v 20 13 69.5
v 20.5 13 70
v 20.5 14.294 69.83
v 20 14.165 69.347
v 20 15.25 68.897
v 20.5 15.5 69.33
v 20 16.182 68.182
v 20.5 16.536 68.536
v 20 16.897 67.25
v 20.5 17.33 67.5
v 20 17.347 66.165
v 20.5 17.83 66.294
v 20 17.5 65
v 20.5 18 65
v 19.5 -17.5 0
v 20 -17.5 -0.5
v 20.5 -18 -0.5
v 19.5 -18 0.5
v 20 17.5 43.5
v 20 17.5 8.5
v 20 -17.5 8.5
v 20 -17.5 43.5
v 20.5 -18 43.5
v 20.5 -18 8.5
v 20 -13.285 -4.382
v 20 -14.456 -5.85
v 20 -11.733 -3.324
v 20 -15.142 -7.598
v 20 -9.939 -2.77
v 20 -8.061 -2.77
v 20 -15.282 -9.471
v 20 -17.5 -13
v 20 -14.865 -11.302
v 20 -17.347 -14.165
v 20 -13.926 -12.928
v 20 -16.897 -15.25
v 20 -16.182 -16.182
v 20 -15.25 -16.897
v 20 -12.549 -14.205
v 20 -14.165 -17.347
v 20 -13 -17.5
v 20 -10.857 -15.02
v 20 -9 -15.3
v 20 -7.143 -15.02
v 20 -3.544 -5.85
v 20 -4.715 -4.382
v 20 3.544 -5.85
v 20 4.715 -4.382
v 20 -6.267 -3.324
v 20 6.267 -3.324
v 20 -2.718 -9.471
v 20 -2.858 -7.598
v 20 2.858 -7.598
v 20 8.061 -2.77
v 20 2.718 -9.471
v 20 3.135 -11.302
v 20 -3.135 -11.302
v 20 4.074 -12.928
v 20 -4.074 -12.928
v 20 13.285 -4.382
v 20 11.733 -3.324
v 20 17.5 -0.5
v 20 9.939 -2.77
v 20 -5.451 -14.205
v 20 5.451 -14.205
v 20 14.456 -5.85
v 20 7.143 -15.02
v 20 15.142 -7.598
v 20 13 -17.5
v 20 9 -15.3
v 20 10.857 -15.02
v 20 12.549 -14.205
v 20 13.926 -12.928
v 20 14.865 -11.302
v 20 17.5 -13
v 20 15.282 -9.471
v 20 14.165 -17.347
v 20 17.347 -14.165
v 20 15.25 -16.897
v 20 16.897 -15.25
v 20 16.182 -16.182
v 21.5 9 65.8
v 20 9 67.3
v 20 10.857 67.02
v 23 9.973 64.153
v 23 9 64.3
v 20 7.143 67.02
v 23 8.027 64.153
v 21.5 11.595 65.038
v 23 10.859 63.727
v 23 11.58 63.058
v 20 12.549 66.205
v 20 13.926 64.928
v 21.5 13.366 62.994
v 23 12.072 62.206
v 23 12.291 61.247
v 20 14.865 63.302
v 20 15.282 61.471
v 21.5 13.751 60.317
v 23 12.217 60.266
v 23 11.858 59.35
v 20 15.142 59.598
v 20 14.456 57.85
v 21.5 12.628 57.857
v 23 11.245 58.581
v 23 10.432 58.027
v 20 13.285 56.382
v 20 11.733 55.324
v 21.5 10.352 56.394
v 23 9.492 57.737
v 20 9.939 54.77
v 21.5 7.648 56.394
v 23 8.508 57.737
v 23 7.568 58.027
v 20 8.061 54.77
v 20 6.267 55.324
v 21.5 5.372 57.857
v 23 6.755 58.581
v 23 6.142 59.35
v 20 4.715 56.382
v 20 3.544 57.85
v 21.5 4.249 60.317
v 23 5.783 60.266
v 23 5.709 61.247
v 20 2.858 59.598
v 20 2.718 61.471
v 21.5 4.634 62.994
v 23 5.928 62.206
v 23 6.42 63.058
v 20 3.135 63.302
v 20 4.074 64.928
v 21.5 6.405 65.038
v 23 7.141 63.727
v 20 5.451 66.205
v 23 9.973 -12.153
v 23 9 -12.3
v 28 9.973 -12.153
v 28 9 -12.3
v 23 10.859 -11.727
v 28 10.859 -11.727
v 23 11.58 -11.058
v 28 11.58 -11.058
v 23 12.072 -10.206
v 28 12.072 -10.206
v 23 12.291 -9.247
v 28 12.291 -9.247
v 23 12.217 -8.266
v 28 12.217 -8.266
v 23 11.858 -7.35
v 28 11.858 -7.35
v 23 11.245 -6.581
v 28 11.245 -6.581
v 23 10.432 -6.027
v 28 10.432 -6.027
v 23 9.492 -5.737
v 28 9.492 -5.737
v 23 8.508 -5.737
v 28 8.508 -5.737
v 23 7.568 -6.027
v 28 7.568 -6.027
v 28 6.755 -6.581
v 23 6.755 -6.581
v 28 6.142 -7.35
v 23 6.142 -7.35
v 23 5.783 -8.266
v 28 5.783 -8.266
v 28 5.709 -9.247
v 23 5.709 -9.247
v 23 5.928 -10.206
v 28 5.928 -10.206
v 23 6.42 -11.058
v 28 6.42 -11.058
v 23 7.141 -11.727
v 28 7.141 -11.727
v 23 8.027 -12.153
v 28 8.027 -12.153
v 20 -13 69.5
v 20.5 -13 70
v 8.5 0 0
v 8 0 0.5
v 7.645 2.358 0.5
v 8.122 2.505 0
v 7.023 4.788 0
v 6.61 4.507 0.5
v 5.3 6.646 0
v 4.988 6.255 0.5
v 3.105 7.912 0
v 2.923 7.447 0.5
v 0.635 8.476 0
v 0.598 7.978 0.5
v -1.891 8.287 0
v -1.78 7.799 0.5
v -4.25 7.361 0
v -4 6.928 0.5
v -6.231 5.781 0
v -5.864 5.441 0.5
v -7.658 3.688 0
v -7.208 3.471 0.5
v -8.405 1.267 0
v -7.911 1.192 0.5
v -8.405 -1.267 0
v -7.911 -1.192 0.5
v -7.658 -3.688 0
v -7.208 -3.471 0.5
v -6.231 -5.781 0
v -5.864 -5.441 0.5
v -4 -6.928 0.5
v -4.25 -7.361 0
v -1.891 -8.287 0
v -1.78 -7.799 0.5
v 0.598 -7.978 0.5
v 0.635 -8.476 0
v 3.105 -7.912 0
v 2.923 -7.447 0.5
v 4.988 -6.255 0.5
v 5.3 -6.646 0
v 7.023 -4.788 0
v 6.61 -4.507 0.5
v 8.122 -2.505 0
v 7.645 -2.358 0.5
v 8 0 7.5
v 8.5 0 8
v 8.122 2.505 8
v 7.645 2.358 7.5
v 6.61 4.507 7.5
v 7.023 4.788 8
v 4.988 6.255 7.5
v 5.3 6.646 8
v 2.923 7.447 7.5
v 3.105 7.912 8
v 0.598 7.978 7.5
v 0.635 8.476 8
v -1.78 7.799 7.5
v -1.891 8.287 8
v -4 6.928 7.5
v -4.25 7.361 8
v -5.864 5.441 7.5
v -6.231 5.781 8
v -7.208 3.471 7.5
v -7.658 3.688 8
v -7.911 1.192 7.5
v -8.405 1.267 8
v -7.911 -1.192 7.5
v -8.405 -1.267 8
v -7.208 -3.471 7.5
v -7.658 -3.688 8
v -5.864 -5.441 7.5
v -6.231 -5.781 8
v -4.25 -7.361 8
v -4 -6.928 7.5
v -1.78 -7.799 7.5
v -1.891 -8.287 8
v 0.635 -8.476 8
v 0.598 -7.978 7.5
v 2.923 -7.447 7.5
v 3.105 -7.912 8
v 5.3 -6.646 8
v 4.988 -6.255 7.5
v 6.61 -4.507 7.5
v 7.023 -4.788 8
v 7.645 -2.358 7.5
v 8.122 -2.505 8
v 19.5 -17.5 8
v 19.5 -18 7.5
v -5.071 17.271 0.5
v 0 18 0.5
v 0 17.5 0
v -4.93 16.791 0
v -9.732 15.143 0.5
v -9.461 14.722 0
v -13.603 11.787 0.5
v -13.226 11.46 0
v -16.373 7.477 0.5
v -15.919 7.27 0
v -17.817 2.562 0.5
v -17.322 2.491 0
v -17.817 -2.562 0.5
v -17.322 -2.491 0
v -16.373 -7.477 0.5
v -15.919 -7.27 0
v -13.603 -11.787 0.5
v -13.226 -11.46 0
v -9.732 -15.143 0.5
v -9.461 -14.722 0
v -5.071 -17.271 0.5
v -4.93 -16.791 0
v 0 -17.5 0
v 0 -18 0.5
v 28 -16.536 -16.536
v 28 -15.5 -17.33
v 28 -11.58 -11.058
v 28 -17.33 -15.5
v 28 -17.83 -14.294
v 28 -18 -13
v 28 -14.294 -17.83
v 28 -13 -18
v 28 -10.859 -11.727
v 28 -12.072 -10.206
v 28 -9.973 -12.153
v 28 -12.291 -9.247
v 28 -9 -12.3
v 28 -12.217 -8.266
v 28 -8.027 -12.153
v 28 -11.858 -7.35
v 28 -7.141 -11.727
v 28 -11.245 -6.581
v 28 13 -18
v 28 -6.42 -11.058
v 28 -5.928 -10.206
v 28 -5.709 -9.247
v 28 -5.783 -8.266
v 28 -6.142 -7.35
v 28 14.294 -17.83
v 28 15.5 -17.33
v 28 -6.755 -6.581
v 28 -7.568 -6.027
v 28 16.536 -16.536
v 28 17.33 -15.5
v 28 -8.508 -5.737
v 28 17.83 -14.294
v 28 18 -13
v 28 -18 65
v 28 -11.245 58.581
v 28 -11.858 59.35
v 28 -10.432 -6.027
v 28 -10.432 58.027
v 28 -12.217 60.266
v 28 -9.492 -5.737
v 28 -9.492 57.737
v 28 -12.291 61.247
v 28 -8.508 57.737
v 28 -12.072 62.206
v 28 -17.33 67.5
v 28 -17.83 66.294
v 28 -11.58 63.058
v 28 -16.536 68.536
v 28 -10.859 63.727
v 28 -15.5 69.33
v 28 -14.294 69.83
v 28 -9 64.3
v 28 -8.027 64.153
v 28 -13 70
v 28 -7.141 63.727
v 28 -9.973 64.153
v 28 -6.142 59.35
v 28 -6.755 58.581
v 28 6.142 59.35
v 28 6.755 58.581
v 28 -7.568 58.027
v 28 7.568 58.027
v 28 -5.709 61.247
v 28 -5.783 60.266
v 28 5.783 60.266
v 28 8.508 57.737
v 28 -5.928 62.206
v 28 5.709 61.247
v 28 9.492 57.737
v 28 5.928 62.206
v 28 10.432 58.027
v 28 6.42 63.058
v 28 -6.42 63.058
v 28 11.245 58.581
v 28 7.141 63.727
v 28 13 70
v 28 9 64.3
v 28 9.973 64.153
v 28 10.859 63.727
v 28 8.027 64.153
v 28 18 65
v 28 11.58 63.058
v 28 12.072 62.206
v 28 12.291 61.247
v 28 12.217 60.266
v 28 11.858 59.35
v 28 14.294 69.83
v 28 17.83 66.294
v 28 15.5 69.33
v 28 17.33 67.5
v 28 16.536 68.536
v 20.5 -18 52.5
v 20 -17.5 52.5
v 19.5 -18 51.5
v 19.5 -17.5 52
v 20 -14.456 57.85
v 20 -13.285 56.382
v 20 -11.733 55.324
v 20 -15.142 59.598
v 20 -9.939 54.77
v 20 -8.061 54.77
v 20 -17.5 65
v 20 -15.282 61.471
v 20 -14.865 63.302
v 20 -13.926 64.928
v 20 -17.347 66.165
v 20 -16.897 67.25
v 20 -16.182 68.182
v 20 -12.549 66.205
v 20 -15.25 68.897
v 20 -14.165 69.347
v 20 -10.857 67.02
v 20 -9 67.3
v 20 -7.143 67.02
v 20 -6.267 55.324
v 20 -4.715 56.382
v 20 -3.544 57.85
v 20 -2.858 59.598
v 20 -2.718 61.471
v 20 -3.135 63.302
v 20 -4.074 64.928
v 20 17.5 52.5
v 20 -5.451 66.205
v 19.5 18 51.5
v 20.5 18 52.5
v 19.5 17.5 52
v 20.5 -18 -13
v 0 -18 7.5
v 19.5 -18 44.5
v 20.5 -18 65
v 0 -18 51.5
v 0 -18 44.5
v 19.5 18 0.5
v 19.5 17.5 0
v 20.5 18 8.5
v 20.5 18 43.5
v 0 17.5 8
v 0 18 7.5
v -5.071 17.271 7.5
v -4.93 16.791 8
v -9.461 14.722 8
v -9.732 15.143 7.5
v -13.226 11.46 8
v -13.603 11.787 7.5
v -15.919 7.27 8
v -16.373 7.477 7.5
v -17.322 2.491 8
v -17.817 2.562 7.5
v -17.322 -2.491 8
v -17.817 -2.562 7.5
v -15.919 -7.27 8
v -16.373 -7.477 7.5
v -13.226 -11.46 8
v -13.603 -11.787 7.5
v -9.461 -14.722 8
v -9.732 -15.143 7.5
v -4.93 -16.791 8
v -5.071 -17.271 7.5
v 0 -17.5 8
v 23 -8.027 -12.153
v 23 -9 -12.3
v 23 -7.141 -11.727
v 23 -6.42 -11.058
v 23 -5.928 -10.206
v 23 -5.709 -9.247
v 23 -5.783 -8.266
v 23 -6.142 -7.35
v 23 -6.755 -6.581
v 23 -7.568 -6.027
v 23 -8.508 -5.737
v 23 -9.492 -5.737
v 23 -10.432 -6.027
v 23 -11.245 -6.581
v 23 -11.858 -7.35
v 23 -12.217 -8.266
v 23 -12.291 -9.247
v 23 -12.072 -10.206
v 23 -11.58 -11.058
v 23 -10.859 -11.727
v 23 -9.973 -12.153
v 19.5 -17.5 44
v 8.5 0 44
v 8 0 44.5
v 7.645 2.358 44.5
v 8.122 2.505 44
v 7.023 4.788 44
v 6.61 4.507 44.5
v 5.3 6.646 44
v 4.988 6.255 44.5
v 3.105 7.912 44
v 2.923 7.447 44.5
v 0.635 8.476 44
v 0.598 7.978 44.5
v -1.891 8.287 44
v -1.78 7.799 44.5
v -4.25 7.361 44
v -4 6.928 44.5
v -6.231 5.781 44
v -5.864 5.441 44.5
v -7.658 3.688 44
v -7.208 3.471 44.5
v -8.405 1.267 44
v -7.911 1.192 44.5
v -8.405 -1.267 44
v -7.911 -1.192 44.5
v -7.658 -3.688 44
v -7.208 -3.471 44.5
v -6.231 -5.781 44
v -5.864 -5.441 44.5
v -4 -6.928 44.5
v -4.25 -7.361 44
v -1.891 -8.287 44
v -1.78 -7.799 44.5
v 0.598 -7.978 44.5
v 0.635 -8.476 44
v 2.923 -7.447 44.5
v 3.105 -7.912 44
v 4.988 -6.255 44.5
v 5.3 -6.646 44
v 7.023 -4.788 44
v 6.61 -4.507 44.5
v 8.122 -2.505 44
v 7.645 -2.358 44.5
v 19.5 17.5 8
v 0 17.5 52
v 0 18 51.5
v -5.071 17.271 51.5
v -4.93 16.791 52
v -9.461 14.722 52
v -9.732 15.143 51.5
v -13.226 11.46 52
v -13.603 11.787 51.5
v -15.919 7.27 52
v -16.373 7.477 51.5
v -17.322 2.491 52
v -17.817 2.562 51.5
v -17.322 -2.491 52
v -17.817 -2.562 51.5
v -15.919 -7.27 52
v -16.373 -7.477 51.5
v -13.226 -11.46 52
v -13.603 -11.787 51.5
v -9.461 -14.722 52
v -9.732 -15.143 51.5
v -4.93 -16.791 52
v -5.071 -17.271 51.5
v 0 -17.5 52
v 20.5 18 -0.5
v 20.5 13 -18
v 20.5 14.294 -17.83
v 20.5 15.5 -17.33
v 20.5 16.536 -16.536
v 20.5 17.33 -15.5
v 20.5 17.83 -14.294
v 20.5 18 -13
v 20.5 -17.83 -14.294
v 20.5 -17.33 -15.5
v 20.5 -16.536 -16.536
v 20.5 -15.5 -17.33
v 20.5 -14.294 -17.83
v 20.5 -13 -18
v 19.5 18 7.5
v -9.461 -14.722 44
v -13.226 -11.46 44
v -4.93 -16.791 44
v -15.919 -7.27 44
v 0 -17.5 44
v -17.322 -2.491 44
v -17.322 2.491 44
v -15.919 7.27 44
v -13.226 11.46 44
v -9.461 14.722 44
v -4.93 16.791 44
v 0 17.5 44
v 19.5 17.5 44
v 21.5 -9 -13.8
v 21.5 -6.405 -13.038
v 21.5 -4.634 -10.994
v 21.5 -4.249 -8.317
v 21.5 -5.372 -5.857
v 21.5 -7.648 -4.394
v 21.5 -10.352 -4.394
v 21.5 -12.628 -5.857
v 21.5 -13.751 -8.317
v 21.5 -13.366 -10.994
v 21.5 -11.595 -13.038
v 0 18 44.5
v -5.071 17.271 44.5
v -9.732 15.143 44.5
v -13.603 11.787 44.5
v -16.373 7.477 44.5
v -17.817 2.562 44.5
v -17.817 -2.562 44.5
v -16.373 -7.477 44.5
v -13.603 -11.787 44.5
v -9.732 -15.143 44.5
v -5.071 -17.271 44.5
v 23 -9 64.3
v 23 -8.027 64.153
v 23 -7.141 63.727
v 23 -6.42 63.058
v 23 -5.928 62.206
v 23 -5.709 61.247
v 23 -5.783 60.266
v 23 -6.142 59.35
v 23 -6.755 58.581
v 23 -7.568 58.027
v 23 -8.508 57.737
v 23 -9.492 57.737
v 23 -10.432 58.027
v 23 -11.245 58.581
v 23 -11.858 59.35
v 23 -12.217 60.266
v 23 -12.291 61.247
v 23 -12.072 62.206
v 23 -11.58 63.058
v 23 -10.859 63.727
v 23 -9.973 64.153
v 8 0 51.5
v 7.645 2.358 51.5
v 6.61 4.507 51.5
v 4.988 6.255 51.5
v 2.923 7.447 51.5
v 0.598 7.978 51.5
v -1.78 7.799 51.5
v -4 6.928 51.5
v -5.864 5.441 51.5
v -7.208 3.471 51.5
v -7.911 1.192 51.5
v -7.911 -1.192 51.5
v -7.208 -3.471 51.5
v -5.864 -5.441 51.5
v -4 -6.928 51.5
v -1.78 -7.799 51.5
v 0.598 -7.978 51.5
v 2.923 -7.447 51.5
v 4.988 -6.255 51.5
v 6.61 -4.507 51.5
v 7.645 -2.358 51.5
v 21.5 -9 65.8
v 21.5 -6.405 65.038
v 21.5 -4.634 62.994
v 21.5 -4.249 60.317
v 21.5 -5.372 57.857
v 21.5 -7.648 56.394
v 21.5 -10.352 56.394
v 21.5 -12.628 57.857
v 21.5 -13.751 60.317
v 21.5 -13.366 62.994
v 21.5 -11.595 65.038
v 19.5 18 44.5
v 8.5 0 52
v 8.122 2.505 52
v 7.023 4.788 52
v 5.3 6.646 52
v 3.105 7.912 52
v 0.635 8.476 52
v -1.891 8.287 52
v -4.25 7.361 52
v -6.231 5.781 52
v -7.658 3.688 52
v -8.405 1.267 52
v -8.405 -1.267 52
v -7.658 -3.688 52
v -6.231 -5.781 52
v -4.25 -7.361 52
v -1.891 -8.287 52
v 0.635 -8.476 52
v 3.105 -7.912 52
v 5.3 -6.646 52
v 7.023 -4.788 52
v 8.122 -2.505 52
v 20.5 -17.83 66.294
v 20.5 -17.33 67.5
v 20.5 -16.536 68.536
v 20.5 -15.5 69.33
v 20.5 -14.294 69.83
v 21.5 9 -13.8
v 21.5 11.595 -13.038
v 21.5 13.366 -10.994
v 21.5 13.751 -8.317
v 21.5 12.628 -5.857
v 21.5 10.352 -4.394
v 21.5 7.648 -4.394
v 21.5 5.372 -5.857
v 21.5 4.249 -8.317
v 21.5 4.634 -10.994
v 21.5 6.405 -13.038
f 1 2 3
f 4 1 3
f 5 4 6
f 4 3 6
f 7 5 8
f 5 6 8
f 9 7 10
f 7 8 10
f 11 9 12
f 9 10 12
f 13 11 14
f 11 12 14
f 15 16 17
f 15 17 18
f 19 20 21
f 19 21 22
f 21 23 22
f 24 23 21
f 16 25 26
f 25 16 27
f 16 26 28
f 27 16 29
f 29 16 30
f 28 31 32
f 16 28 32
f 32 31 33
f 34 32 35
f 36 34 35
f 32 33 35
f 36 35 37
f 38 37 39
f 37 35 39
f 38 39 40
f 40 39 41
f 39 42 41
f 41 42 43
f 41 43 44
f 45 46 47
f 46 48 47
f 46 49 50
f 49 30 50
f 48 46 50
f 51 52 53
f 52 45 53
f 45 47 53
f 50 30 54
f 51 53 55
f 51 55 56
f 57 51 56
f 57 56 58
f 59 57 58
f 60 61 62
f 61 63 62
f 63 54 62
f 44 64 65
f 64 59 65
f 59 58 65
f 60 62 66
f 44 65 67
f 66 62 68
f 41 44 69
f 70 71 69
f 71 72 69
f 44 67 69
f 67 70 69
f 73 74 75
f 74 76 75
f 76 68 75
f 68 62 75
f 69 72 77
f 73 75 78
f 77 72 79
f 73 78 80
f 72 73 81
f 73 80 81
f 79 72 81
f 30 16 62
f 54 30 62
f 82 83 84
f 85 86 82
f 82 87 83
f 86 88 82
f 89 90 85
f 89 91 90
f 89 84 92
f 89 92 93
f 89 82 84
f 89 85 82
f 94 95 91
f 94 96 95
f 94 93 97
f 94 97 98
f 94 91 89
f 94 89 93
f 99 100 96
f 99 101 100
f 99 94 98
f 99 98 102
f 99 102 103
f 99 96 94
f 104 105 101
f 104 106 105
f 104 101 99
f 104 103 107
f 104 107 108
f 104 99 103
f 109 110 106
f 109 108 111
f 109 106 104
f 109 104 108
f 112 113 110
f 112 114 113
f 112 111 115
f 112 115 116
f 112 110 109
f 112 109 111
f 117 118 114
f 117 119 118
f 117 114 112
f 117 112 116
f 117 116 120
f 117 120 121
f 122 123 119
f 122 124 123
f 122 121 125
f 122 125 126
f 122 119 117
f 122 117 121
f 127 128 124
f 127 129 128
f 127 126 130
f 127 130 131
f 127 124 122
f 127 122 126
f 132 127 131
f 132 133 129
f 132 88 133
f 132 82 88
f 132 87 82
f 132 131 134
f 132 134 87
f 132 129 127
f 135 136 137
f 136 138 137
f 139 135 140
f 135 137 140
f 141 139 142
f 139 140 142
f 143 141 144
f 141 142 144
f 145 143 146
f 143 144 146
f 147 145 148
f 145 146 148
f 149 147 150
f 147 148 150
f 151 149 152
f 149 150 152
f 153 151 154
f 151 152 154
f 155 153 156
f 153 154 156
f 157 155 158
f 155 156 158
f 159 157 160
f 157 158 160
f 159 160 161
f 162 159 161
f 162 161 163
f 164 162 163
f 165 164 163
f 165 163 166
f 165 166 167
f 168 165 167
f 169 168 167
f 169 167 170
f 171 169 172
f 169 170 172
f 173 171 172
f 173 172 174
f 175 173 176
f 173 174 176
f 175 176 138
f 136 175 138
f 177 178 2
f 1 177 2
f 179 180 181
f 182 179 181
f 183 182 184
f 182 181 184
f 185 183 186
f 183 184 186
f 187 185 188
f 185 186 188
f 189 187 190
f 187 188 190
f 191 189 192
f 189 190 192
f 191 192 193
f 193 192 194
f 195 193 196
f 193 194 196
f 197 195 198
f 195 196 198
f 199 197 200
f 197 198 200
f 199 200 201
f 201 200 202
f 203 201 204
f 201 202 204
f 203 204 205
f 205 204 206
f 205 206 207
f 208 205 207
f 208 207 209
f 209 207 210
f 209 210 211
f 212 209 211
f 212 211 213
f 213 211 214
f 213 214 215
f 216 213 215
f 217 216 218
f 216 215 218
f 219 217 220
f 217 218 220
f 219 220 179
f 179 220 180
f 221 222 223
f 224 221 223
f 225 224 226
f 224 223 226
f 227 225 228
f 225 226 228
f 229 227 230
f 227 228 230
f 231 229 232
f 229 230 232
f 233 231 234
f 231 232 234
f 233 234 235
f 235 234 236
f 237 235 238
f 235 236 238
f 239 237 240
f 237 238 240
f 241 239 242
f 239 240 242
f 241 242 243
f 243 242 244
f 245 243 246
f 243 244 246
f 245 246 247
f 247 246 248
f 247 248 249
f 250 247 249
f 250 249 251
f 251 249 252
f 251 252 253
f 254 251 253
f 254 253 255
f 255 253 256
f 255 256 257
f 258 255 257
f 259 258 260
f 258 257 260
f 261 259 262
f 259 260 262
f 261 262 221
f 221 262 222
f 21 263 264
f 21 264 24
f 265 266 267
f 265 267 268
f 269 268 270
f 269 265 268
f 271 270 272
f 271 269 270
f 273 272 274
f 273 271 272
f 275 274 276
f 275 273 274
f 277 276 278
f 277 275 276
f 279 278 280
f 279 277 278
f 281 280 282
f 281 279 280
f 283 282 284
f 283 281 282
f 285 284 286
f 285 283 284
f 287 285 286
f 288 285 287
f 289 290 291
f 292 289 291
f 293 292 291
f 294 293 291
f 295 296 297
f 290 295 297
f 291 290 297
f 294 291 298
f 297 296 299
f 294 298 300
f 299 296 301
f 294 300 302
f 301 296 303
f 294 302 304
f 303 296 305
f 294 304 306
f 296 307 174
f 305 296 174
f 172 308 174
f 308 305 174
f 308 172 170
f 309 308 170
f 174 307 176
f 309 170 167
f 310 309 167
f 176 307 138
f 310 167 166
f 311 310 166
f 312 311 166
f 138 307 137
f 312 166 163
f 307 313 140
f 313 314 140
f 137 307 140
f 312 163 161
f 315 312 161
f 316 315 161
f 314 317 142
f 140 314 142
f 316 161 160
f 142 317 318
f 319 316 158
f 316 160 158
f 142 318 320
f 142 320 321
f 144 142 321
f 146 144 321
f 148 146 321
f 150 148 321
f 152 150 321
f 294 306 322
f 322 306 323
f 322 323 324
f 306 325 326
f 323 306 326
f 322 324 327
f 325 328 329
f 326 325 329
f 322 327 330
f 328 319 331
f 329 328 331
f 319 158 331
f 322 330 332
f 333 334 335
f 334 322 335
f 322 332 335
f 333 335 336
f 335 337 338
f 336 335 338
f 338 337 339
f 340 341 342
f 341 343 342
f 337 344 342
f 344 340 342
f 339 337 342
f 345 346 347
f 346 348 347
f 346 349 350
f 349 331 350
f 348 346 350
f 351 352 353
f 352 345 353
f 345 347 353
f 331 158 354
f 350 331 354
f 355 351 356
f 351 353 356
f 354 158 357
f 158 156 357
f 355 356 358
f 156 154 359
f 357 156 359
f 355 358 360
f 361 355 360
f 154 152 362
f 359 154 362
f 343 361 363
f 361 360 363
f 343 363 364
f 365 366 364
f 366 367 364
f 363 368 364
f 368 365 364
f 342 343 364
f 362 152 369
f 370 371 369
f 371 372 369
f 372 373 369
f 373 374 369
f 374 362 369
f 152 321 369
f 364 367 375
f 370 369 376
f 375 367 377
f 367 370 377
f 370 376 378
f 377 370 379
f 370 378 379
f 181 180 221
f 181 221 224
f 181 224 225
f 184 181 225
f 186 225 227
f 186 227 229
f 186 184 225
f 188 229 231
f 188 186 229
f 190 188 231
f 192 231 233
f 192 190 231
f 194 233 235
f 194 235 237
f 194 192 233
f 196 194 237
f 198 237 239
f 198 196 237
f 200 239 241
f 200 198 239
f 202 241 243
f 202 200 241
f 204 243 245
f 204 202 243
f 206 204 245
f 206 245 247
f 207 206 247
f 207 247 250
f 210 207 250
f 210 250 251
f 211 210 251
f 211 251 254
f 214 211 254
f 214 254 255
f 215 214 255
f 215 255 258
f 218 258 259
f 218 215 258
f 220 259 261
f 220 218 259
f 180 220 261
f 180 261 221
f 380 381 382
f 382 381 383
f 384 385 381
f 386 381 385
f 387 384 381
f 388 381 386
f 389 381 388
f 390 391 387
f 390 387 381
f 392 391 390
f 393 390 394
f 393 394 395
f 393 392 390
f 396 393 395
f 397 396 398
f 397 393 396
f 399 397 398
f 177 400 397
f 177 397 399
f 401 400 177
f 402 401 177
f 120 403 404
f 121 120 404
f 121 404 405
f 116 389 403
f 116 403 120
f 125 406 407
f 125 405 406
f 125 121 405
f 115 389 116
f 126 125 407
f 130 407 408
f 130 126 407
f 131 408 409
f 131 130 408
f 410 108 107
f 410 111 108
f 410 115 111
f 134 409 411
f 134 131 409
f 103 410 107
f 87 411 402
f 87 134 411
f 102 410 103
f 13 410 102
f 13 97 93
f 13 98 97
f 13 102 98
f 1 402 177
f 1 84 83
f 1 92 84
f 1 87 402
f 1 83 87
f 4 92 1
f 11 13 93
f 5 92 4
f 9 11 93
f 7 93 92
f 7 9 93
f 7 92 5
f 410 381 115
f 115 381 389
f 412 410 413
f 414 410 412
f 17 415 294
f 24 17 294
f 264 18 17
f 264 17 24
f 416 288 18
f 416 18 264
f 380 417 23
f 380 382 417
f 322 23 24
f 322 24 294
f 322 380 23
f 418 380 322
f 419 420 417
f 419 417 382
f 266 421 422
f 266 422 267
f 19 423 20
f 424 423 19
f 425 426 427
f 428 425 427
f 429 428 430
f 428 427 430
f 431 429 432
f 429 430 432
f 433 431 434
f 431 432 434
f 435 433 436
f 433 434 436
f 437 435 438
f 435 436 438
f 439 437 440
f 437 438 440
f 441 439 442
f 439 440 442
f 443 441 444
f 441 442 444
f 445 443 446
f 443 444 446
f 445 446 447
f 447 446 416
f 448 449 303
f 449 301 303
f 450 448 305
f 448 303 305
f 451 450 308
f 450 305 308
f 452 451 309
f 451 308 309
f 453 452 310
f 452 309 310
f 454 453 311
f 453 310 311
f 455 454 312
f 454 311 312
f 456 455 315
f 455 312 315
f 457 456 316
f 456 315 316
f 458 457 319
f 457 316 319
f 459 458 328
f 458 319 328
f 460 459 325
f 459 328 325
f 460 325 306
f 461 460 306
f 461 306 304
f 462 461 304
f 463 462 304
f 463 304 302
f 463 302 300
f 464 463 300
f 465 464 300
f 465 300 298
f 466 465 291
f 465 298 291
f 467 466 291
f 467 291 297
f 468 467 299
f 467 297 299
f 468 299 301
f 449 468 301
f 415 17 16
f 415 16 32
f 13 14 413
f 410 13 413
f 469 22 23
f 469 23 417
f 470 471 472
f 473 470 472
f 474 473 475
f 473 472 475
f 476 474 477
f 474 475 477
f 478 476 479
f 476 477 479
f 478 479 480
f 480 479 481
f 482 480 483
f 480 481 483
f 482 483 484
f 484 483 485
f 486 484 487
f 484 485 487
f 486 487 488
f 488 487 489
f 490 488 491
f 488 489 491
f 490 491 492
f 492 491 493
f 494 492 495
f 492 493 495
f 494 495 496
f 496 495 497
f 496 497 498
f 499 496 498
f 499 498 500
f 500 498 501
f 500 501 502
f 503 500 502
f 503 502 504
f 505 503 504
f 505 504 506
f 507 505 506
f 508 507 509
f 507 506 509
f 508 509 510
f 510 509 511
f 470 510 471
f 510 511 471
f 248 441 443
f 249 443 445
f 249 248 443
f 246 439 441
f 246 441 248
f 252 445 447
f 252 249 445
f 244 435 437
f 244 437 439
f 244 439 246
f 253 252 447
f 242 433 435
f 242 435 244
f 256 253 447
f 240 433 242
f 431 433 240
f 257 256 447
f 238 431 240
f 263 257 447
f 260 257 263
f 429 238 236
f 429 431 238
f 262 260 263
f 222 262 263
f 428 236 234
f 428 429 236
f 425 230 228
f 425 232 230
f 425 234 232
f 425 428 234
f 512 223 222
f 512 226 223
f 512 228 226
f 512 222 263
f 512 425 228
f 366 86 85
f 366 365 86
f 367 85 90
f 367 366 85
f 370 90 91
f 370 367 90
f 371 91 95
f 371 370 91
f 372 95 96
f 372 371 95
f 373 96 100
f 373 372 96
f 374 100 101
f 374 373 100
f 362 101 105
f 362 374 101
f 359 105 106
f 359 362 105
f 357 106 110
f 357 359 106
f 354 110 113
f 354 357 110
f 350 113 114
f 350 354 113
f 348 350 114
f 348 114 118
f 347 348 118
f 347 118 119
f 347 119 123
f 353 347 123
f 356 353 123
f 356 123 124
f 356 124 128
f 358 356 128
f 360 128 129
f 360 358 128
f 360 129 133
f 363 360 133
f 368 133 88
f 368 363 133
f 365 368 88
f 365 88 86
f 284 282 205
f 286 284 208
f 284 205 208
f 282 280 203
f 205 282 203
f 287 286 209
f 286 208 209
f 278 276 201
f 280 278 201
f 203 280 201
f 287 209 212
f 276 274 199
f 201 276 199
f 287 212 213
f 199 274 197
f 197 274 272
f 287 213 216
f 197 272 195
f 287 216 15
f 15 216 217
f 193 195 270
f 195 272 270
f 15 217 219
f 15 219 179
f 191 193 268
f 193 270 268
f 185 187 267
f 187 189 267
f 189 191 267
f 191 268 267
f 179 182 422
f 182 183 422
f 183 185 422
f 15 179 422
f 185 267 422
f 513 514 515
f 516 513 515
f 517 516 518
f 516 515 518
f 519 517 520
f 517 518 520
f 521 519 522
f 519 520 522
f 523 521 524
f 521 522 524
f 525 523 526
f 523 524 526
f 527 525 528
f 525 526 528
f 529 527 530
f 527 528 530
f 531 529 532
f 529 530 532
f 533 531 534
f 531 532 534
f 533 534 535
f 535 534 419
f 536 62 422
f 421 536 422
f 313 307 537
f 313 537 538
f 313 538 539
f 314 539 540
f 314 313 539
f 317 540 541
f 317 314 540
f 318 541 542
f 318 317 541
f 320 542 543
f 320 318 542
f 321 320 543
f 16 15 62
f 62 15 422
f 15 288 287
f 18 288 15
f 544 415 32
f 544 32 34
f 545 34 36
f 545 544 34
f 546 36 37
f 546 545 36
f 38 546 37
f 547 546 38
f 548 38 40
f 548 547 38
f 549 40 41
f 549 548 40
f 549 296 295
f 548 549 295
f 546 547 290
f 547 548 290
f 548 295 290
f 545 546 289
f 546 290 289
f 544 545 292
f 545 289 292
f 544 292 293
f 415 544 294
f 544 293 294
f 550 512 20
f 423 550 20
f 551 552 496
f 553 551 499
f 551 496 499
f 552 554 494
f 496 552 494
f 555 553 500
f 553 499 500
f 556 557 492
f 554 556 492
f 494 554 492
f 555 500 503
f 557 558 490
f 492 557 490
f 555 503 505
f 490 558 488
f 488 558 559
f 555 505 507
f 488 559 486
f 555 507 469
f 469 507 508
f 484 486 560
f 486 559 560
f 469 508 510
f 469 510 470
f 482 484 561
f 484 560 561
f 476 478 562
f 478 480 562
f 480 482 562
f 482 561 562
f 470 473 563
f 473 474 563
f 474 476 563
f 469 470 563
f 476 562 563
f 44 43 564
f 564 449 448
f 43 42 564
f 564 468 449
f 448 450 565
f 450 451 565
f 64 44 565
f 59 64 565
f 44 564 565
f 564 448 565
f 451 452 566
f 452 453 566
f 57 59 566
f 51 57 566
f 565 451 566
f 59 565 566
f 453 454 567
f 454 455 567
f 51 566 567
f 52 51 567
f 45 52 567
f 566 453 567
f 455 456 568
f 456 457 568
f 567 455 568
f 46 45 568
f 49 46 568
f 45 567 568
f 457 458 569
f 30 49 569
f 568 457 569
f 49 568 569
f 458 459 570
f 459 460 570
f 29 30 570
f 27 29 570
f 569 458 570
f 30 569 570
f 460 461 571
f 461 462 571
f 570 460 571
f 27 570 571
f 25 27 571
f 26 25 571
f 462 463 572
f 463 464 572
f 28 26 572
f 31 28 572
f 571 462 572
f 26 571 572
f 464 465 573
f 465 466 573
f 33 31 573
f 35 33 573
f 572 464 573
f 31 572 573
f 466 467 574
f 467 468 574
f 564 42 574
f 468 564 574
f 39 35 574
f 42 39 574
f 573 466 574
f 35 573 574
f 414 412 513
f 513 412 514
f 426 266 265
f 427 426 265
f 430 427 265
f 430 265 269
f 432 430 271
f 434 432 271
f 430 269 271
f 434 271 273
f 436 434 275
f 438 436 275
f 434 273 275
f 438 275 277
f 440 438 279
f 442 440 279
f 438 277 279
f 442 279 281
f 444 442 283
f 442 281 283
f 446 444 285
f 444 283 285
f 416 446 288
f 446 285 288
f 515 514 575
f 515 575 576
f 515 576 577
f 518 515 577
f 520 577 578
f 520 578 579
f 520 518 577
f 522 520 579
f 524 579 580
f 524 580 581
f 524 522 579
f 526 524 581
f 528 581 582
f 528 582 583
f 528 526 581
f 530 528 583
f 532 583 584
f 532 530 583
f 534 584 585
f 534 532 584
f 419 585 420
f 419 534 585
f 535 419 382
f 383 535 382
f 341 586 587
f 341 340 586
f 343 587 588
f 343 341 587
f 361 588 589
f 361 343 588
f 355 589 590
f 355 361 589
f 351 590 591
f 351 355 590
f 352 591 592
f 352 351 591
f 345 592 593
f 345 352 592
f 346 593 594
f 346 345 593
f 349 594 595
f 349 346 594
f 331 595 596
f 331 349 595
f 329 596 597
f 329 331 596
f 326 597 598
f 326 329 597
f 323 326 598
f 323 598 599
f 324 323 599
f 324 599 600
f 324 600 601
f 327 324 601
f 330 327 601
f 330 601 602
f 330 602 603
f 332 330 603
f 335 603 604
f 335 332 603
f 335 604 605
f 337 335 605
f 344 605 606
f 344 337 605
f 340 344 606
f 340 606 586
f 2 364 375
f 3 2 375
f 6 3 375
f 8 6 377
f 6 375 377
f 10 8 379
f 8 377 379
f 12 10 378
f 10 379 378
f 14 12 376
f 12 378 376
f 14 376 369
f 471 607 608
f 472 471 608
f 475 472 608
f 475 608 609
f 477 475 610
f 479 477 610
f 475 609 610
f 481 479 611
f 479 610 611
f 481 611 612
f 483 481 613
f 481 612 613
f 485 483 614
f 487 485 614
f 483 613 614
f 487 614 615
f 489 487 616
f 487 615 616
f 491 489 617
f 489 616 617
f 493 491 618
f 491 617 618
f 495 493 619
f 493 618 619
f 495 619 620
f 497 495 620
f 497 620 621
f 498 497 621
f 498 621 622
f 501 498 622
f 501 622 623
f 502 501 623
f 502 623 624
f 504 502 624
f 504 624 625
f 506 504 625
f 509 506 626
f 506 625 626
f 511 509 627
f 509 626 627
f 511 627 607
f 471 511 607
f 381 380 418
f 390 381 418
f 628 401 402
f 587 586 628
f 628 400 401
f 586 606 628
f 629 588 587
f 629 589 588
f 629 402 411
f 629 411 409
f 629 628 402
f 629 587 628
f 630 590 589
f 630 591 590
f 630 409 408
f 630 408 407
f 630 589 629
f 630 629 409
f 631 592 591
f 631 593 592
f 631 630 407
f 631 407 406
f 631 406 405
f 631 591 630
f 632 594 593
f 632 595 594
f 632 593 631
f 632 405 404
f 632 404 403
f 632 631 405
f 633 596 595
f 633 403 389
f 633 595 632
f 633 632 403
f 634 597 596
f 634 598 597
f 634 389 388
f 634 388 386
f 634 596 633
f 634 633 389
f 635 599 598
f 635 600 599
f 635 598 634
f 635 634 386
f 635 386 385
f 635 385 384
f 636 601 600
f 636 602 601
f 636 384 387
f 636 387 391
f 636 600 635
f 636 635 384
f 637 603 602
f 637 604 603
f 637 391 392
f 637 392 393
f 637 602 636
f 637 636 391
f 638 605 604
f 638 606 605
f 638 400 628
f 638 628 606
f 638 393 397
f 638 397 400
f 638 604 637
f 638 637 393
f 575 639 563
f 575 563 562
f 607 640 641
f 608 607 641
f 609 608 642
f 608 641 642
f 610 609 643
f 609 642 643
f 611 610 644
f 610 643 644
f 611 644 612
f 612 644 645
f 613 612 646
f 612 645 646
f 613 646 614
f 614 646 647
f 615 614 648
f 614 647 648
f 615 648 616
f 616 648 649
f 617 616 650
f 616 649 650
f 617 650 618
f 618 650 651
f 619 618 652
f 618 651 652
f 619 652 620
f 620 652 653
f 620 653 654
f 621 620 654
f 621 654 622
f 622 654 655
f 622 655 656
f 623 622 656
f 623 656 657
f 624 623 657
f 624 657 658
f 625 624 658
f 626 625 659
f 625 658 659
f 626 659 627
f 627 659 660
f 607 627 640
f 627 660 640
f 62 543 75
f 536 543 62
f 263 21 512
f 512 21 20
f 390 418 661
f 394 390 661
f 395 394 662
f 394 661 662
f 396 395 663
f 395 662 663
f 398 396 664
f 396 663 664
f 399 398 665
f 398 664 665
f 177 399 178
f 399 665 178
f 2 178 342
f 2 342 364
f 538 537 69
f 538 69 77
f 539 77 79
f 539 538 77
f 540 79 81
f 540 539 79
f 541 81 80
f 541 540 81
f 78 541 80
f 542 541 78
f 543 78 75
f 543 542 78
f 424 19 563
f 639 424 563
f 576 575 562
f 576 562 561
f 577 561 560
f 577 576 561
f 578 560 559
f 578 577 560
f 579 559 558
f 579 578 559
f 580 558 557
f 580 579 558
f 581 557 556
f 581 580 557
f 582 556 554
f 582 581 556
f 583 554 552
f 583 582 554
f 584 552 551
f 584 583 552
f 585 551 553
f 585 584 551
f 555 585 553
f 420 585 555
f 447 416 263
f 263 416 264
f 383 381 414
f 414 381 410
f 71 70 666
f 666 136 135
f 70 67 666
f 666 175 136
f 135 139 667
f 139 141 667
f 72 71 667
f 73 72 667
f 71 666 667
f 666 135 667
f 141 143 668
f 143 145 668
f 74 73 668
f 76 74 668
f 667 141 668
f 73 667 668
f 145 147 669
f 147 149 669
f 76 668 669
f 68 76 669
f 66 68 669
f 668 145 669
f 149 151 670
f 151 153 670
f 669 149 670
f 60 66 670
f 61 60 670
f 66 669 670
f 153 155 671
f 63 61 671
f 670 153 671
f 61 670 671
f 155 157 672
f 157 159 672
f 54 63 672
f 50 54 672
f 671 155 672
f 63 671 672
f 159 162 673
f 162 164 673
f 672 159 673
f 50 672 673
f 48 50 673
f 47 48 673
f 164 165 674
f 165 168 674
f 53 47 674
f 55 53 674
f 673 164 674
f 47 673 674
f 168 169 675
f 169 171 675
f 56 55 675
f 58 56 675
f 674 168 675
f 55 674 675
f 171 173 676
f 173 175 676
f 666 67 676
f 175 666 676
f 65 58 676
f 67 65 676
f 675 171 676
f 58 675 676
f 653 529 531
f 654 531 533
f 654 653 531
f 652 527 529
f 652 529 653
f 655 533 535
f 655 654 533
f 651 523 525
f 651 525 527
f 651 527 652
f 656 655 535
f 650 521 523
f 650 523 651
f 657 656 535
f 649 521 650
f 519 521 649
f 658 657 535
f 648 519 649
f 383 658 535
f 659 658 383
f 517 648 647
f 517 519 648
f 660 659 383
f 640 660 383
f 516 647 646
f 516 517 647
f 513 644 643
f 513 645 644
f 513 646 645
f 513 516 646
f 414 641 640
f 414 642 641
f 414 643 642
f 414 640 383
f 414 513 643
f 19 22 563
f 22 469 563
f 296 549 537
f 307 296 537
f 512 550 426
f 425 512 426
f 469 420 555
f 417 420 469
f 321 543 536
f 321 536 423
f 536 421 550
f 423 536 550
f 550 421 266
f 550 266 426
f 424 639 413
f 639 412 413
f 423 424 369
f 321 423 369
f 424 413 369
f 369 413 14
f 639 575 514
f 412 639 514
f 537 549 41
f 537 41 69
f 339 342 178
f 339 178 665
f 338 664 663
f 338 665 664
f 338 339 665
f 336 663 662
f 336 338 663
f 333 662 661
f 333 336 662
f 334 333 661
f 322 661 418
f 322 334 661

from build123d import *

# Parameters (mm, degrees)
SKETCH1_R                                           = 8
BOSS_EXTRUDE1_DEPTH                                 = 8
SKETCH3_W                                           = 44
SKETCH3_H                                           = 36
BOSS_EXTRUDE2_DEPTH                                 = 8
CSK_FOR_M6_COUNTERSUNK_FLAT_HEAD_SCREW1_D           = 6.6
CSK_FOR_M6_COUNTERSUNK_FLAT_HEAD_SCREW1_DEPTH       = 12
CSK_FOR_M6_COUNTERSUNK_FLAT_HEAD_SCREW1_CSINK_D     = 12.6
CSK_FOR_M6_COUNTERSUNK_FLAT_HEAD_SCREW1_CSINK_ANGLE = 90
CSK_FOR_M6_COUNTERSUNK_FLAT_HEAD_SCREW1_TIP         = 1.982840043
FILLET1_R                                           = 5
CHAMFER1_SIZE                                       = 0.5


with BuildPart() as part:
    # Sketch1 → Boss-Extrude1 (new body)
    with BuildSketch(Plane.XY):
        with BuildLine():
            Line((20, -18), (20, 18))
            Line((20, 18), (0, 18))
            ThreePointArc((0, 18), (-18, 0), (0, -18))
            Line((0, -18), (20, -18))
        make_face()
        Circle(SKETCH1_R, mode=Mode.SUBTRACT)
    extrude(amount=BOSS_EXTRUDE1_DEPTH)

    # Sketch3 → Boss-Extrude2 (add)
    with BuildSketch(Plane(origin=(20, 0, 0), x_dir=(0, 0, -1), z_dir=(1, 0, 0))):
        with Locations((-4, 0)):
            Rectangle(SKETCH3_W, SKETCH3_H)
    extrude(amount=BOSS_EXTRUDE2_DEPTH)

    # CSK for M6 Countersunk Flat Head Screw1
    with Locations(Plane.ZY.offset(-20)):
        with Locations((-9, 9), (-9, -9)):
            CounterSinkHole(CSK_FOR_M6_COUNTERSUNK_FLAT_HEAD_SCREW1_D / 2, CSK_FOR_M6_COUNTERSUNK_FLAT_HEAD_SCREW1_CSINK_D / 2, depth=CSK_FOR_M6_COUNTERSUNK_FLAT_HEAD_SCREW1_DEPTH, counter_sink_angle=CSK_FOR_M6_COUNTERSUNK_FLAT_HEAD_SCREW1_CSINK_ANGLE)
            with Locations((0, 0, -(CSK_FOR_M6_COUNTERSUNK_FLAT_HEAD_SCREW1_DEPTH + CSK_FOR_M6_COUNTERSUNK_FLAT_HEAD_SCREW1_TIP / 2))):  # 118° drill point
                Cone(0, CSK_FOR_M6_COUNTERSUNK_FLAT_HEAD_SCREW1_D / 2, CSK_FOR_M6_COUNTERSUNK_FLAT_HEAD_SCREW1_TIP, mode=Mode.SUBTRACT)

    # Fillet1
    fillet1_edges = [part.edges().sort_by_distance(p)[0] for p in [
        (24, -18, -18),
        (24, 18, -18),
    ]]
    fillet(fillet1_edges, radius=FILLET1_R)

    # Mirror1: part across plane


with BuildPart() as part_1:
    add(part.part)
    add(part.part.mirror(Plane(origin=(28, -18, 26), x_dir=(1, 0, 0), z_dir=(0, 0, -1))))

    # Chamfer1
    chamfer1_edges = [part_1.edges().sort_by_distance(p)[0] for p in [
        (-8, 0, 0),
        (-8, 0, 8),
        (20, 0, 8),
        (10, 18, 8),
        (20, 18, 26),
        (20, -18, 26),
        (20, -18, -6.5),
        (20, 0, -18),
        (20, 18, -6.5),
        (20, 16.535533906, -16.535533906),
        (-18, 0, 8),
        (10, 18, 0),
        (20, -16.535533906, -16.535533906),
        (20, 0, 0),
        (10, -18, 0),
        (-18, 0, 0),
        (-8, 0, 44),
        (-18, 0, 52),
        (10, -18, 52),
        (20, 0, 52),
        (10, 18, 52),
        (-18, 0, 44),
        (10, -18, 44),
        (10, 18, 44),
        (-8, 0, 52),
        (20, 0, 70),
        (20, 18, 58.5),
        (20, -18, 58.5),
        (20, 0, 44),
        (20, -16.535533906, 68.535533906),
        (20, 16.535533906, 68.535533906),
        (10, -18, 8),
    ]]
    chamfer(chamfer1_edges, length=CHAMFER1_SIZE)


solid = part_1.part
